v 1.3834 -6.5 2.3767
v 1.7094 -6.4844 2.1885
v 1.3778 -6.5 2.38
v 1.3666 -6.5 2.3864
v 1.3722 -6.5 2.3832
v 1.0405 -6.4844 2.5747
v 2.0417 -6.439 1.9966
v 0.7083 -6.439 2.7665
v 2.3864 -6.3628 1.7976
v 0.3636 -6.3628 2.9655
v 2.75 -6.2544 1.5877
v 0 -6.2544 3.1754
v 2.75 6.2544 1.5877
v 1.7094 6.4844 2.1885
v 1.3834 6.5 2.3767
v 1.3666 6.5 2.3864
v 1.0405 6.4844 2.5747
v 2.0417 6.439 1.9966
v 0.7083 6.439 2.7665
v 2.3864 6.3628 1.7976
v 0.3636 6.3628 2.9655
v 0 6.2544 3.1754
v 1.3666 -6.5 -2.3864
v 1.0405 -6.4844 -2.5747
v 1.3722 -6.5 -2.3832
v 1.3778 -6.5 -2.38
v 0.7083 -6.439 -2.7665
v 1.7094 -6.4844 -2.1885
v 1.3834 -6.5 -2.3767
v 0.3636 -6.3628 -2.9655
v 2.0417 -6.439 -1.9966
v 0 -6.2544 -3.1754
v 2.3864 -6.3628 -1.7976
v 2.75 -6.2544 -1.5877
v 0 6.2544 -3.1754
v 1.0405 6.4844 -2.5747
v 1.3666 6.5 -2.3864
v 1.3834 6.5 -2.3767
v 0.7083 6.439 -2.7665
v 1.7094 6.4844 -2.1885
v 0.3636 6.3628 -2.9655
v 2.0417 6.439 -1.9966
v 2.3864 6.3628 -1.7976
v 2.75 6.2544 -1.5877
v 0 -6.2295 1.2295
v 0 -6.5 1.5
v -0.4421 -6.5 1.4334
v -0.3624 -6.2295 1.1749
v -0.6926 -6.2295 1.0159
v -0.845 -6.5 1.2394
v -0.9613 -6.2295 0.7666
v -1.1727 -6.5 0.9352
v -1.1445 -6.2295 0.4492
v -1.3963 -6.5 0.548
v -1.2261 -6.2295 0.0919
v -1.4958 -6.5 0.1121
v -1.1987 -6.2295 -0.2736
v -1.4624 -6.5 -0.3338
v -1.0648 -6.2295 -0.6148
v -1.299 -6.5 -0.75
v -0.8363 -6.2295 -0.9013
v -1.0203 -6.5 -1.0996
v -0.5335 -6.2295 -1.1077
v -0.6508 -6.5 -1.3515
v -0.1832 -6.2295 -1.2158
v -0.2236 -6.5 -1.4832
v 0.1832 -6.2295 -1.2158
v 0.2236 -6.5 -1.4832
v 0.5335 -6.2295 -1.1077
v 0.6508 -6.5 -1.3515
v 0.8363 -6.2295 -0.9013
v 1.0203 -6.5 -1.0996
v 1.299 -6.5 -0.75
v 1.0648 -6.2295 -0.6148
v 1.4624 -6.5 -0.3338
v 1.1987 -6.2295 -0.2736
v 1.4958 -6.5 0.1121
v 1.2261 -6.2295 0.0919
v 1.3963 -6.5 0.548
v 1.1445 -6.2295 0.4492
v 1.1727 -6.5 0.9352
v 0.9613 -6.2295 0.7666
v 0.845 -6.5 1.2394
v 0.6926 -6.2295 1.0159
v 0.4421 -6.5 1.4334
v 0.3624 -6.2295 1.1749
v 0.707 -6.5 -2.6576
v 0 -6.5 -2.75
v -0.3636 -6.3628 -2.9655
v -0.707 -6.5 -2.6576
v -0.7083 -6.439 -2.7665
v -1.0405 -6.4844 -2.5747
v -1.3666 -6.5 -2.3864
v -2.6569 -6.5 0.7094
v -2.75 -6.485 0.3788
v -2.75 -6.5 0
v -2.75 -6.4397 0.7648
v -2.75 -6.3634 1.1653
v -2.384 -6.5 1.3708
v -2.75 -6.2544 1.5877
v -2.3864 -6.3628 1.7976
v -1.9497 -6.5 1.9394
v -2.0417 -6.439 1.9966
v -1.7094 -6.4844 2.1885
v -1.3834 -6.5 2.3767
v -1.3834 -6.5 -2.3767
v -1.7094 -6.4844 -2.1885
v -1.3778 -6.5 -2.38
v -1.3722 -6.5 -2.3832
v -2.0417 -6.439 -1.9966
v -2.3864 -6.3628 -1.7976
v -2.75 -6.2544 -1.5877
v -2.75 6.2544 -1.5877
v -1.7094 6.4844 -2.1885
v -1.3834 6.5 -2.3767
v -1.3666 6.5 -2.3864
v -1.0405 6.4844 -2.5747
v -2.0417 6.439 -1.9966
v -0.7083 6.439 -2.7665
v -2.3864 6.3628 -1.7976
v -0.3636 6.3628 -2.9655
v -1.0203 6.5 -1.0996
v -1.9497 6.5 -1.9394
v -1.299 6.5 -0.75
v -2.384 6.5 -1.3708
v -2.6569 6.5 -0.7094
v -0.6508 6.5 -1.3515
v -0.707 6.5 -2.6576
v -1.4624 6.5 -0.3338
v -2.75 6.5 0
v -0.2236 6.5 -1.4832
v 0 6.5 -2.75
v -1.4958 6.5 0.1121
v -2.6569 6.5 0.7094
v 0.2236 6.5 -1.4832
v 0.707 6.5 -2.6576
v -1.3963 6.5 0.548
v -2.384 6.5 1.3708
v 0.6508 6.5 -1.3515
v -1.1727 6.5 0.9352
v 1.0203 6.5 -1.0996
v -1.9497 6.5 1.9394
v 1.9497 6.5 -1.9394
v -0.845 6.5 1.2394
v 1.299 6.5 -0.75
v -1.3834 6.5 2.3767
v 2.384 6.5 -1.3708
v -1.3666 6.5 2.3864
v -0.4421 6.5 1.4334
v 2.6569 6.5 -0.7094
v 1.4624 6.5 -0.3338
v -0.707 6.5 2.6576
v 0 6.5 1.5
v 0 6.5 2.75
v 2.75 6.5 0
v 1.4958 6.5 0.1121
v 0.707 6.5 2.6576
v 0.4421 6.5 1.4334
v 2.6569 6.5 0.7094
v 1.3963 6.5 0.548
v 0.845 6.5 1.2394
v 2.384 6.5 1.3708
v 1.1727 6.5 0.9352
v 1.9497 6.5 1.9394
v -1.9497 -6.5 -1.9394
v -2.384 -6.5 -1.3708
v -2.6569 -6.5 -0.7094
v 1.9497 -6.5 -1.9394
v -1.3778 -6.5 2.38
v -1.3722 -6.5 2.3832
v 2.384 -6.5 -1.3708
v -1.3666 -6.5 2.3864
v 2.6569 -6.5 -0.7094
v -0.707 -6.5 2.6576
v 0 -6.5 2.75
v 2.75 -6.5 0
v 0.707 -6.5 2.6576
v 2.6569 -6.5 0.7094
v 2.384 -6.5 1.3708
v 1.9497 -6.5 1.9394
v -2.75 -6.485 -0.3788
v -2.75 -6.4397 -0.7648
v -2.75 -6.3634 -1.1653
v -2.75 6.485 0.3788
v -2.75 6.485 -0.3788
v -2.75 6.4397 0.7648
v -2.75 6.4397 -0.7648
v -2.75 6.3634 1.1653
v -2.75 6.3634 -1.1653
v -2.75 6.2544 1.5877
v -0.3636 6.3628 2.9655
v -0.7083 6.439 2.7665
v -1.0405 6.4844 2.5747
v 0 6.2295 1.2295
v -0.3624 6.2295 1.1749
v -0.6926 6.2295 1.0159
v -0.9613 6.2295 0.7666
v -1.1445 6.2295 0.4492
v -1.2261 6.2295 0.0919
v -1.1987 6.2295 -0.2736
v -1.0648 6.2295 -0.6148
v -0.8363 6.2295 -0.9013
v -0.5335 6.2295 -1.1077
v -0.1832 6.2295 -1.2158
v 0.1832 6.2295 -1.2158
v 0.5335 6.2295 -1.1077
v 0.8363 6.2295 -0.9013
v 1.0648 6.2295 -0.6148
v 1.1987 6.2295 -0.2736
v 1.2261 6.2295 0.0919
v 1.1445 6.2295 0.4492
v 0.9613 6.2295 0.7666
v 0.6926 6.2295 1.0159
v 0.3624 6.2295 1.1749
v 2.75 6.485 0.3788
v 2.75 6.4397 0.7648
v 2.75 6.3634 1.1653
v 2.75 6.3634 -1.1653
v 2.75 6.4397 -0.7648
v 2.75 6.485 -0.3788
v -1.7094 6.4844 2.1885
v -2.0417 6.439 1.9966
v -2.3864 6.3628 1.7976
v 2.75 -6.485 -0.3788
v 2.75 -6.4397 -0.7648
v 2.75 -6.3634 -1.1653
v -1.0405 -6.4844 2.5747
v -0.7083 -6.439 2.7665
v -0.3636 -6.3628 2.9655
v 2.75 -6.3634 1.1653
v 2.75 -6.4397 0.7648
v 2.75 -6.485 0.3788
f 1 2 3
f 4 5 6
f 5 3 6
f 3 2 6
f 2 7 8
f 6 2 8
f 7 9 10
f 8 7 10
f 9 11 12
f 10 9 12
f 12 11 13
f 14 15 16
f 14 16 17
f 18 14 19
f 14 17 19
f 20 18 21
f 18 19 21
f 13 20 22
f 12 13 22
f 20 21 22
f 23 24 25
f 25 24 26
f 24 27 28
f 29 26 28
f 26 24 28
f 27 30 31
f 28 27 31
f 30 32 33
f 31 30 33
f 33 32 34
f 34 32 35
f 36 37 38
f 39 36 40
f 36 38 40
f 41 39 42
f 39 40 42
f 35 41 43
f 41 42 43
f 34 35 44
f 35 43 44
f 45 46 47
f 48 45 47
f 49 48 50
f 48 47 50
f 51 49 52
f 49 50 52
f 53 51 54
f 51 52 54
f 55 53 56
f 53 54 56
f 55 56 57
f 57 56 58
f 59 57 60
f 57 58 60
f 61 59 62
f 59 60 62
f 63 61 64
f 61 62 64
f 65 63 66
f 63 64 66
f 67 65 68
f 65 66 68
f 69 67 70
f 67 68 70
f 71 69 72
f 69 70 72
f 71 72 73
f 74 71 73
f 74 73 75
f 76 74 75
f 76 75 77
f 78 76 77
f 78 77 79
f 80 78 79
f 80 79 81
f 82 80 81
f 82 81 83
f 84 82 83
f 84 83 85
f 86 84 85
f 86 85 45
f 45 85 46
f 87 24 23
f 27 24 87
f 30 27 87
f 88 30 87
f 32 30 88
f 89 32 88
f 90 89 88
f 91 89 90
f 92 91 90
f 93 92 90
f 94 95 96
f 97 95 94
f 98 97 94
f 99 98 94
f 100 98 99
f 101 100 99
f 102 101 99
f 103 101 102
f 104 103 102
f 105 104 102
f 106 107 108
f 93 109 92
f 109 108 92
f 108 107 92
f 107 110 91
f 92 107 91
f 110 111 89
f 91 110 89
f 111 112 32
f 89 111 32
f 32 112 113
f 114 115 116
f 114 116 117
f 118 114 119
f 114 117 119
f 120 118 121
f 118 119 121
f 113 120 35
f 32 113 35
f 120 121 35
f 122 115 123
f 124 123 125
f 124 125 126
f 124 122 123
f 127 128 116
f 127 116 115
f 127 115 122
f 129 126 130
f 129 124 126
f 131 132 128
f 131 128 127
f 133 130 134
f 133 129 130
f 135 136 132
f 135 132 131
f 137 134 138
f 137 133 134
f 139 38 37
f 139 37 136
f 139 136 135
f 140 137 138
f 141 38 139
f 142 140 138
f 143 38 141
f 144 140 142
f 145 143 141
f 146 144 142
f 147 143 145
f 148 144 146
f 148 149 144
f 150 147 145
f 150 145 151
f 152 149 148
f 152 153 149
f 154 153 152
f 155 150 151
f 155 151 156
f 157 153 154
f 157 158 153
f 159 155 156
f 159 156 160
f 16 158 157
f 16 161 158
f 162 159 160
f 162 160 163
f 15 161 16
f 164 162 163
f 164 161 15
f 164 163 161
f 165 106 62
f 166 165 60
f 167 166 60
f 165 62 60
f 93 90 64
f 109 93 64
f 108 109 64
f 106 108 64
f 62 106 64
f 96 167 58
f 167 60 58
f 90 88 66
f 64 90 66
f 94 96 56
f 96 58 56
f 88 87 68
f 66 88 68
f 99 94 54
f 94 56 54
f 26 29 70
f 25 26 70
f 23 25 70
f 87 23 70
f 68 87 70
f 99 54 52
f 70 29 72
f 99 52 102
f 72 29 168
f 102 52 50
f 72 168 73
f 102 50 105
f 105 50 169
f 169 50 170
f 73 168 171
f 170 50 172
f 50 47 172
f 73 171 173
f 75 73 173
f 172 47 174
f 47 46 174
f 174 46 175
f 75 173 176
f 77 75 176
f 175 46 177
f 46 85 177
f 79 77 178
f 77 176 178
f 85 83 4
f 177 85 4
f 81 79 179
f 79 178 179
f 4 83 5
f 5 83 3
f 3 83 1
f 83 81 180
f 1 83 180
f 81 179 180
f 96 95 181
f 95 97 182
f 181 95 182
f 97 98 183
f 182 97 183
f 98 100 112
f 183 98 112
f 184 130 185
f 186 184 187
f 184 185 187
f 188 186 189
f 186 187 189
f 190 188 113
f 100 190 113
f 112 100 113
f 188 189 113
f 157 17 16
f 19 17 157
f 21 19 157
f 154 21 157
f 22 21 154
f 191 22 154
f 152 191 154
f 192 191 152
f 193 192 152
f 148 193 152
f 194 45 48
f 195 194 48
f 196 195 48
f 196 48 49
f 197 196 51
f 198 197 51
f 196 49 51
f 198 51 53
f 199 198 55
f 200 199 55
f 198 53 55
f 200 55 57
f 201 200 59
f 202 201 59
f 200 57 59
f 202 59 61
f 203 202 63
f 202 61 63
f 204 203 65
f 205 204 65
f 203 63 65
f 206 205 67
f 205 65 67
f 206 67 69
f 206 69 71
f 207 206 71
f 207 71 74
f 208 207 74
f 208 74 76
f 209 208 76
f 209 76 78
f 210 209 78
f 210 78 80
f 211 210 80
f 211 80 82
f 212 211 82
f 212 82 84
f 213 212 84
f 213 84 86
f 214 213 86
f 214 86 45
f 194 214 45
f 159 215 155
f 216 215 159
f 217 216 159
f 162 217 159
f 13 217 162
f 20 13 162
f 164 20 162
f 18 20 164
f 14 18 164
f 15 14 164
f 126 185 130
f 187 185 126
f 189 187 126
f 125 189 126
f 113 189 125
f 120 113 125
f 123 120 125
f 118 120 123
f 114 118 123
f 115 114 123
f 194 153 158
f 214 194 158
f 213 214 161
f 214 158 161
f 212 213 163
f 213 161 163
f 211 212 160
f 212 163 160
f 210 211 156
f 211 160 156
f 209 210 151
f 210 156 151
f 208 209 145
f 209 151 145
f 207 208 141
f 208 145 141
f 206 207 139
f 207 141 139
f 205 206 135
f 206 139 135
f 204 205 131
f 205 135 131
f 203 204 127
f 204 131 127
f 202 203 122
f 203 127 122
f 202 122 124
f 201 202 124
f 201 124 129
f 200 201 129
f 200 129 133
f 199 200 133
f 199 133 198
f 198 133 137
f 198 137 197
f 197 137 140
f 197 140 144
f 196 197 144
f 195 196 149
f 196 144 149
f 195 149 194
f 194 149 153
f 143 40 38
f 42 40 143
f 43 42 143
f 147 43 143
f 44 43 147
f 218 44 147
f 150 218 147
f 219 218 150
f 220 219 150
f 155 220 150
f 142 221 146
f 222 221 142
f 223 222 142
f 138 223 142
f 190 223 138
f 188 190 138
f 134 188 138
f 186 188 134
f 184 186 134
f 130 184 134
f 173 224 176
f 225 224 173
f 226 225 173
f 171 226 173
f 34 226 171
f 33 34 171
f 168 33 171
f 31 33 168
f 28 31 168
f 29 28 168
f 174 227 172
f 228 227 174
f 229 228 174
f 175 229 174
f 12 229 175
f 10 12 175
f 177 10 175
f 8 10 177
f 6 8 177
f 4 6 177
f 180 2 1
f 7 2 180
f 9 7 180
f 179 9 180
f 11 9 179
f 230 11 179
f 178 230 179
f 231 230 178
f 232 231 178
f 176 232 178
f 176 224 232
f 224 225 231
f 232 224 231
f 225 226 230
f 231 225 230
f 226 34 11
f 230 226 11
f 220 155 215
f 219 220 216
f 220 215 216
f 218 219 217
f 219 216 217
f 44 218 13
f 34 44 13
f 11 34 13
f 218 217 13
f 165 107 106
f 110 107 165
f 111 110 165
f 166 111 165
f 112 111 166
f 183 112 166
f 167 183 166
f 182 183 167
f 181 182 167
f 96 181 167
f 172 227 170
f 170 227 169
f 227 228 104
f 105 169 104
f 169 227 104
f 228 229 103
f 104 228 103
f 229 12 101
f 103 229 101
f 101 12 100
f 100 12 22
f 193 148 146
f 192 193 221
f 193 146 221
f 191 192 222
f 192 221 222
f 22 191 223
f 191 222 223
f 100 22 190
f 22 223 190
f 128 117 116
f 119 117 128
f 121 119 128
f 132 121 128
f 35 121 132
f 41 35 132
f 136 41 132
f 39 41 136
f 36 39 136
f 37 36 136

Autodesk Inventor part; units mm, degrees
ref_plane "YZ Plane" through (0, 0, 0) normal (1, 0, 0) x (0, 1, 0)
ref_plane "XZ Plane" through (0, 0, 0) normal (0, 1, 0) x (-1, 0, 0)
ref_plane "XY Plane" through (0, 0, 0) normal (0, 0, 1) x (1, 0, 0)
sketch "スケッチ1" plane through (0, 0, 0) normal (1, 0, 0) x (0, 1, 0)
  line L0 (-6.5, 0) -> (6.5, 0)
  line L1 (0, 0) -> (0, 3.1754) construction
  line L2 (-6.2544, 3.1754) -> (-6.5, 2.75)
  line L3 (-6.5, 2.75) -> (-6.5, 0)
  line L4 (-6.2544, 3.1754) -> (6.2544, 3.1754)
  line L5 (6.2544, 3.1754) -> (6.5, 2.75)
  line L6 (6.5, 2.75) -> (6.5, 0)
  dimension "d1" = 2.75
  dimension "d2" = 3.1754
  dimension "d3" = 30
  dimension "d4" = 13
revolve "回転1" add sketch "スケッチ1" angle 360 about axis through (0, -6.5, 0) along (0, 1, 0)
sketch "スケッチ2" plane through (0, 6.5, 0) normal (0, 1, 0) x (1, 0, 0)
  circle A0 centre (0, 0) radius 3.1754 projected
  line L0 (0, -3.1754) -> (-2.75, -1.5877)
  line L1 (-2.75, -1.5877) -> (-2.75, 1.5877)
  line L2 (-2.75, 1.5877) -> (0, 3.1754)
  line L3 (0, 3.1754) -> (2.75, 1.5877)
  line L4 (2.75, 1.5877) -> (2.75, -1.5877)
  line L5 (2.75, -1.5877) -> (0, -3.1754)
  point P0 (0, 0)
  point P1 (0, 0)
  point P2 (2.75, -1.5877)
  point P3 (2.75, -1.5877)
  point P4 (2.75, 1.5877)
  point P5 (2.75, 1.5877)
  point P6 (0, 3.1754)
  point P7 (0, 3.1754)
  point P8 (-2.75, 1.5877)
  point P9 (-2.75, 1.5877)
  point P10 (-2.75, -1.5877)
  point P11 (-2.75, -1.5877)
extrude "押し出し1" cut sketch "スケッチ2" against normal through all contours A0 L4 | L3 A0 | A0 L5 | L2 A0 | A0 L0 | L1 A0
hole "穴1" at (0, 6.5, 0) direction (0, -1, 0) diameter 2.459 end through all countersink diameter 3 countersink angle 90 thread size "M3x0.5" class "6H" standard "ISO Metric profile"
mirror "ミラー1" about plane through (0, 0, 0) normal (0, 1, 0) of "穴1"
equation "\"d2\" = 1.1547 * d1"
properties part number "ASL-313BE" material "アルミニウム 2014-T4"
